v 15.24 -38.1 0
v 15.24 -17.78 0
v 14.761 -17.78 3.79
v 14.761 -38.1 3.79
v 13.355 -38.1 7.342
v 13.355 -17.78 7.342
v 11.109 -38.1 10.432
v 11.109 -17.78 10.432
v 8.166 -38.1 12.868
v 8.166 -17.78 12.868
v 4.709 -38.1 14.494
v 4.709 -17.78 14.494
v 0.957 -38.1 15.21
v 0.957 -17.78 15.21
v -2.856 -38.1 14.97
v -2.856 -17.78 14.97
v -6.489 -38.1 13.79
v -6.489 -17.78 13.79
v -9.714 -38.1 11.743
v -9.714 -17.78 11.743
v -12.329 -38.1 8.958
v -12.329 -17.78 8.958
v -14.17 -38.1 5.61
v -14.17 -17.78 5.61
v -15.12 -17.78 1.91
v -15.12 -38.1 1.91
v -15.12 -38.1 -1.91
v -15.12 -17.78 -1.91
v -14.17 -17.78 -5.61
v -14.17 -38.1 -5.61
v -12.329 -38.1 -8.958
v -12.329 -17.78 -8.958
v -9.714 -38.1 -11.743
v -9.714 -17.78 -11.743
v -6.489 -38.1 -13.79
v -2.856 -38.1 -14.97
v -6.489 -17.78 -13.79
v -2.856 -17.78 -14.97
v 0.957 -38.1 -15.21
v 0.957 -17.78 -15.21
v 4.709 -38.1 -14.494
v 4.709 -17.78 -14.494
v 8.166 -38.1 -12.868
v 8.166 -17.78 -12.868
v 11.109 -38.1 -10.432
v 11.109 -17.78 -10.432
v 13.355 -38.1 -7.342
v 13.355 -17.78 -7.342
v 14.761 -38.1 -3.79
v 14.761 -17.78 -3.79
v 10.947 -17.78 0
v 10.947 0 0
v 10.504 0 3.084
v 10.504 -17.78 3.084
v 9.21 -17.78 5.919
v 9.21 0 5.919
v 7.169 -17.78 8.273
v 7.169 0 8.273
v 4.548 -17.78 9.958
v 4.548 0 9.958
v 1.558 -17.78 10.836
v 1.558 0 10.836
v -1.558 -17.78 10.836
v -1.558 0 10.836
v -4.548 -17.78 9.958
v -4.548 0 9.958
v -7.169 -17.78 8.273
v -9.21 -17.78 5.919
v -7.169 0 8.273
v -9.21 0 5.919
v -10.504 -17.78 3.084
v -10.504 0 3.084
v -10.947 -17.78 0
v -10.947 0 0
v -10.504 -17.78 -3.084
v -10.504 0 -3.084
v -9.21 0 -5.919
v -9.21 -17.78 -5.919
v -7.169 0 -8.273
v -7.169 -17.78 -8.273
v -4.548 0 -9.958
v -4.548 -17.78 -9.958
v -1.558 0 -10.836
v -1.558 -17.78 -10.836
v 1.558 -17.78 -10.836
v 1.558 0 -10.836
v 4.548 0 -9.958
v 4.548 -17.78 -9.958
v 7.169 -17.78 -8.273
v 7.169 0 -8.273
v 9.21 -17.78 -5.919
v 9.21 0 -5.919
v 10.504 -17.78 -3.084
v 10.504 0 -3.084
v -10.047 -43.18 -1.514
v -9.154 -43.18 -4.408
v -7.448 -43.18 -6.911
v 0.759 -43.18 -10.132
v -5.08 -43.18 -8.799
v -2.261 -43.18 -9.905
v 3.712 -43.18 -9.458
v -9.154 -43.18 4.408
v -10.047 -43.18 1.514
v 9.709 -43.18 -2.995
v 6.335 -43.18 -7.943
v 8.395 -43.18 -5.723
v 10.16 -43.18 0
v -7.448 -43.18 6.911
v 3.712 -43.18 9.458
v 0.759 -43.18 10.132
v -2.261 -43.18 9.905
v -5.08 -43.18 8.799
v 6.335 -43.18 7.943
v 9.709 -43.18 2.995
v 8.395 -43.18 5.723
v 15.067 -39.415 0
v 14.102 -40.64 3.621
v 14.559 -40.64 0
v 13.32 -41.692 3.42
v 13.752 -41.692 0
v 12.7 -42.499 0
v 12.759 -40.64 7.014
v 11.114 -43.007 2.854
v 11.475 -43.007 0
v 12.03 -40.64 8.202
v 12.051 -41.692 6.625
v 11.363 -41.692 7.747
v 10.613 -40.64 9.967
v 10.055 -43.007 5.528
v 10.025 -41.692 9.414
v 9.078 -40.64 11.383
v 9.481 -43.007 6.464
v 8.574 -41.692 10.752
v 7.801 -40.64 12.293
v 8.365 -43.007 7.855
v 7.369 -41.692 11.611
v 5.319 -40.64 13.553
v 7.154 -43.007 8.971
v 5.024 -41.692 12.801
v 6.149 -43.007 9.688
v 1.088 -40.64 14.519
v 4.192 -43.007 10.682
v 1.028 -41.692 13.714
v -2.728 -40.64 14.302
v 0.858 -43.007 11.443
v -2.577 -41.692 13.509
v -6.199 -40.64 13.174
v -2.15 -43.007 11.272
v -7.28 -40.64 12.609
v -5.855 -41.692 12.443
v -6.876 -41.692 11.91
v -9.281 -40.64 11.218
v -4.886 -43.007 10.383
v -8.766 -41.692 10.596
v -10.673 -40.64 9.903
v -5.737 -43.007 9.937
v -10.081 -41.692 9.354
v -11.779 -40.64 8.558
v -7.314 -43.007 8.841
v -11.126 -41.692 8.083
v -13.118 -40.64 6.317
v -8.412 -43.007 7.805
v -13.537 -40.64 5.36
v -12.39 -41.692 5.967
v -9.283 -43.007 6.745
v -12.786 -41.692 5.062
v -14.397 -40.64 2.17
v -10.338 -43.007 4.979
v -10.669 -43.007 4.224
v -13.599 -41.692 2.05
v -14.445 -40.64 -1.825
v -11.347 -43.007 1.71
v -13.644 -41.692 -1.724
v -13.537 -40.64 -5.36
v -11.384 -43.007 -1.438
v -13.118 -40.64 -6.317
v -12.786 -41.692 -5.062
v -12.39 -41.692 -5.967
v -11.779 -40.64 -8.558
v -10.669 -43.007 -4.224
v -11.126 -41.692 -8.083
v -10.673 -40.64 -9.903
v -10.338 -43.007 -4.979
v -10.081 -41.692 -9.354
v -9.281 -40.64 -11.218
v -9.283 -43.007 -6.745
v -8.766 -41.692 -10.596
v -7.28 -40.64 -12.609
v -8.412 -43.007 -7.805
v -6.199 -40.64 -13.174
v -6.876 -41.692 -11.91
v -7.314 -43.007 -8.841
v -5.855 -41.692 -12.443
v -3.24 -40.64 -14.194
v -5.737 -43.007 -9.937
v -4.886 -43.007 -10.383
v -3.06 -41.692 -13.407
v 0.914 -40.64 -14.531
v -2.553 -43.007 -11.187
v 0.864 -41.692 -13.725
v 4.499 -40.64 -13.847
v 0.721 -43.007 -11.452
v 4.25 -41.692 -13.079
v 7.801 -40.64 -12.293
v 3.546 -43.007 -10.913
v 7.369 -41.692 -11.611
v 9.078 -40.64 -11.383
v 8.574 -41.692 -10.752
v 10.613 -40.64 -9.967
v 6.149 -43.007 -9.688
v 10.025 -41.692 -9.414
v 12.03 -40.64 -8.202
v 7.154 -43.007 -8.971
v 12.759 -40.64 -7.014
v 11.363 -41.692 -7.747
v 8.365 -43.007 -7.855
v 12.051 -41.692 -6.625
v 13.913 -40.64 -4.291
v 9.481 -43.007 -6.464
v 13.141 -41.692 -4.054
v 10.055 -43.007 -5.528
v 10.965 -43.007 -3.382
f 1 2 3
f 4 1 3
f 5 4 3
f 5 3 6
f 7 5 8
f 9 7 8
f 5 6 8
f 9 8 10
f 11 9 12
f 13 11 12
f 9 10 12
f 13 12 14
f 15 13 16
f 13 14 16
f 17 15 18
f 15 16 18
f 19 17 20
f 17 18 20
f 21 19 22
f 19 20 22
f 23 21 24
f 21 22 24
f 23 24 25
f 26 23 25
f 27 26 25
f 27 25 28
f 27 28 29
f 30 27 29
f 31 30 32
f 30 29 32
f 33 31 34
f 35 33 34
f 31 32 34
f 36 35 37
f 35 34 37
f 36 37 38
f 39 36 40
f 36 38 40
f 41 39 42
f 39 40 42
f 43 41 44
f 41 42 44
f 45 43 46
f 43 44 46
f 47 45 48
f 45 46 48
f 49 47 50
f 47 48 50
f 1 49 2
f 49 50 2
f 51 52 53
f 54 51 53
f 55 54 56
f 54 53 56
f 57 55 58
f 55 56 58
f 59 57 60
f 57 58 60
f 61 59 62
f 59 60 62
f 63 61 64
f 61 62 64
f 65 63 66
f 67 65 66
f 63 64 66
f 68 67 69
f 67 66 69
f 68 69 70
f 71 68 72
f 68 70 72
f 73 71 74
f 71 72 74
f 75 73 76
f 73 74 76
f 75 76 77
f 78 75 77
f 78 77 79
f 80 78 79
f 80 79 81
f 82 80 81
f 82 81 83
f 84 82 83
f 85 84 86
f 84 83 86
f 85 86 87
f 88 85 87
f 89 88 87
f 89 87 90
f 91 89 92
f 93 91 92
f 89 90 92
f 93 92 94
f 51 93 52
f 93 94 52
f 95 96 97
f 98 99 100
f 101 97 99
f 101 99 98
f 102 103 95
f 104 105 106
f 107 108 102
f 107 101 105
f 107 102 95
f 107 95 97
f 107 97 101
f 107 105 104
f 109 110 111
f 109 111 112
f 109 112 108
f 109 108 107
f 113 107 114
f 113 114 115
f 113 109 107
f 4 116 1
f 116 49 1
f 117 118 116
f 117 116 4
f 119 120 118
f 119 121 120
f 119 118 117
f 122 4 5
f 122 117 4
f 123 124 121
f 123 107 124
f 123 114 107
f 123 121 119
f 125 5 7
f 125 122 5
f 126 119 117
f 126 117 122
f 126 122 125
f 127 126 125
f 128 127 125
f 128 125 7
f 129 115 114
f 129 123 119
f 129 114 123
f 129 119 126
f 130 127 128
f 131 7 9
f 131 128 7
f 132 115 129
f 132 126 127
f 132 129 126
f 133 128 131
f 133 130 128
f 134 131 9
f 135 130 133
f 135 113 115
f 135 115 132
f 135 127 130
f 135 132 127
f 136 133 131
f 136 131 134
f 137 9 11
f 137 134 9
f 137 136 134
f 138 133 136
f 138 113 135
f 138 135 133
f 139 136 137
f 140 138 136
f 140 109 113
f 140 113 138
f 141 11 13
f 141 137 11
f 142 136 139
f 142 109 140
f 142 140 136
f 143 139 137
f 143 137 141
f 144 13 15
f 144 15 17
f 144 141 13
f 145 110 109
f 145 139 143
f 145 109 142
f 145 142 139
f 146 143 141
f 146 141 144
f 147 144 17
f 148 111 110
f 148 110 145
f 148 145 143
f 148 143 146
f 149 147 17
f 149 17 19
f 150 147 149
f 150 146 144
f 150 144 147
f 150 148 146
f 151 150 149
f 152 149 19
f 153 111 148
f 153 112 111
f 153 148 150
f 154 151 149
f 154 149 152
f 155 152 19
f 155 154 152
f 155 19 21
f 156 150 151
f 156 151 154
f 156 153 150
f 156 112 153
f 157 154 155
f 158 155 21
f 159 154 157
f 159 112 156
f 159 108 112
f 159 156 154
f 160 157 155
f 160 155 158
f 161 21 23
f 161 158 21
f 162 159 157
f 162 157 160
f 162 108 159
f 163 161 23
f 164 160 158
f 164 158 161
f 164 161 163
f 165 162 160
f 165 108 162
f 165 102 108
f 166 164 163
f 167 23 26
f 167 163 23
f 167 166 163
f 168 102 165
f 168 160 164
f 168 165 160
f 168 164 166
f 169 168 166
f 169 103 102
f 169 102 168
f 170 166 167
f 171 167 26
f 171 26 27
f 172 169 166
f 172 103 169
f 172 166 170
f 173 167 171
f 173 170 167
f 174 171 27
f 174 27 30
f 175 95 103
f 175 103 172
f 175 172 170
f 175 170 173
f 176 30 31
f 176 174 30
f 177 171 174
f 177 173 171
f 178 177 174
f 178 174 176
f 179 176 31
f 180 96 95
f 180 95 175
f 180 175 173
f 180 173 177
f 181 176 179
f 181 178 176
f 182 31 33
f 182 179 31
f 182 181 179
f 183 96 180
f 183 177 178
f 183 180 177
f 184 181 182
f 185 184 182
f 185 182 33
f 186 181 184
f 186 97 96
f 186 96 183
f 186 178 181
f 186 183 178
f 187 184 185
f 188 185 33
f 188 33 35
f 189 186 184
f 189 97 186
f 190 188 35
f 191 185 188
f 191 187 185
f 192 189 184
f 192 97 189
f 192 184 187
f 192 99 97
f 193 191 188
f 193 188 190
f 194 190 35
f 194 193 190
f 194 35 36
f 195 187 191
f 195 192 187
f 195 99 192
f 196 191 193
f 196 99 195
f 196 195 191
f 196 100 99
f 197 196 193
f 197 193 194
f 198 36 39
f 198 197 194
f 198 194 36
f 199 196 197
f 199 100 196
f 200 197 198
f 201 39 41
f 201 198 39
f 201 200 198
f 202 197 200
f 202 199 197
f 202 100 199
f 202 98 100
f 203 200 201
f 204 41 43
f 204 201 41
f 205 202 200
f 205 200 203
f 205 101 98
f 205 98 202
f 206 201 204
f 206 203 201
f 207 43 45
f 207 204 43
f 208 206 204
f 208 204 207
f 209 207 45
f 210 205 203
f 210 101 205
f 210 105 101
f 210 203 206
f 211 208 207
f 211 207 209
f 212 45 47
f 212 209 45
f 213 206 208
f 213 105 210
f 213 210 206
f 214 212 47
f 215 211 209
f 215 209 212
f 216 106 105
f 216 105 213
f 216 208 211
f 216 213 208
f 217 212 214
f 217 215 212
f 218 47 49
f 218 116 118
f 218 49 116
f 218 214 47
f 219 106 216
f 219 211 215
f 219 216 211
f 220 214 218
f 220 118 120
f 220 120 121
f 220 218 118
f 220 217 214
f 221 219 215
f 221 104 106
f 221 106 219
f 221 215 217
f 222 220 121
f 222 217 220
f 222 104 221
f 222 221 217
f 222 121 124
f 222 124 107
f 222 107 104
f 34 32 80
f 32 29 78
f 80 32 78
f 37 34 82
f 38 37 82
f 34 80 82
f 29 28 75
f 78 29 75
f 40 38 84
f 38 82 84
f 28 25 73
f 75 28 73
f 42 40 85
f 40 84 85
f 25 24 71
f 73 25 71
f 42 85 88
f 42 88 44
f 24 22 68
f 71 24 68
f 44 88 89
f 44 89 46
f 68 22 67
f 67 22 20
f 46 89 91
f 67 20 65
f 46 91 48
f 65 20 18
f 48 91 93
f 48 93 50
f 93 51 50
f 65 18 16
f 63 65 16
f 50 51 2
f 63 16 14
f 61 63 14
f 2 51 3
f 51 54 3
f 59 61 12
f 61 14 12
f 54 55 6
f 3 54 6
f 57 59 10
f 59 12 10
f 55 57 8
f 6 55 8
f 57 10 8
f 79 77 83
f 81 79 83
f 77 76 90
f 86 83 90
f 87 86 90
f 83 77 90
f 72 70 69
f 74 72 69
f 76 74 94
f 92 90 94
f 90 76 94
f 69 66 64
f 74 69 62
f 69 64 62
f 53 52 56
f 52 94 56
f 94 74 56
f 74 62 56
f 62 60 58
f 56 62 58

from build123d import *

# Parameters (mm, degrees)
F0_R     = 10.9474
F1_DEPTH = 17.78
F2_R     = 15.24
F2_R_2   = 10.9474
F3_DEPTH = 25.4
F4_R     = 5.08


with BuildPart() as f1:
    # F0 (on Front) → F1 (new body)
    with BuildSketch(Plane.XZ):
        Circle(F0_R)
    extrude(amount=F1_DEPTH)

    # F2 (on face) → F3 (join)
    with BuildSketch(Plane.XZ.offset(17.78)):
        Circle(F2_R)
        Circle(F2_R_2, mode=Mode.SUBTRACT)
        Circle(F2_R_2)
    extrude(amount=F3_DEPTH)

    # F4
    f4_edges = [f1.edges().sort_by_distance(p)[0] for p in [
        (-15.24, -43.18, 0),
    ]]
    fillet(f4_edges, radius=F4_R)


solid = f1.part
